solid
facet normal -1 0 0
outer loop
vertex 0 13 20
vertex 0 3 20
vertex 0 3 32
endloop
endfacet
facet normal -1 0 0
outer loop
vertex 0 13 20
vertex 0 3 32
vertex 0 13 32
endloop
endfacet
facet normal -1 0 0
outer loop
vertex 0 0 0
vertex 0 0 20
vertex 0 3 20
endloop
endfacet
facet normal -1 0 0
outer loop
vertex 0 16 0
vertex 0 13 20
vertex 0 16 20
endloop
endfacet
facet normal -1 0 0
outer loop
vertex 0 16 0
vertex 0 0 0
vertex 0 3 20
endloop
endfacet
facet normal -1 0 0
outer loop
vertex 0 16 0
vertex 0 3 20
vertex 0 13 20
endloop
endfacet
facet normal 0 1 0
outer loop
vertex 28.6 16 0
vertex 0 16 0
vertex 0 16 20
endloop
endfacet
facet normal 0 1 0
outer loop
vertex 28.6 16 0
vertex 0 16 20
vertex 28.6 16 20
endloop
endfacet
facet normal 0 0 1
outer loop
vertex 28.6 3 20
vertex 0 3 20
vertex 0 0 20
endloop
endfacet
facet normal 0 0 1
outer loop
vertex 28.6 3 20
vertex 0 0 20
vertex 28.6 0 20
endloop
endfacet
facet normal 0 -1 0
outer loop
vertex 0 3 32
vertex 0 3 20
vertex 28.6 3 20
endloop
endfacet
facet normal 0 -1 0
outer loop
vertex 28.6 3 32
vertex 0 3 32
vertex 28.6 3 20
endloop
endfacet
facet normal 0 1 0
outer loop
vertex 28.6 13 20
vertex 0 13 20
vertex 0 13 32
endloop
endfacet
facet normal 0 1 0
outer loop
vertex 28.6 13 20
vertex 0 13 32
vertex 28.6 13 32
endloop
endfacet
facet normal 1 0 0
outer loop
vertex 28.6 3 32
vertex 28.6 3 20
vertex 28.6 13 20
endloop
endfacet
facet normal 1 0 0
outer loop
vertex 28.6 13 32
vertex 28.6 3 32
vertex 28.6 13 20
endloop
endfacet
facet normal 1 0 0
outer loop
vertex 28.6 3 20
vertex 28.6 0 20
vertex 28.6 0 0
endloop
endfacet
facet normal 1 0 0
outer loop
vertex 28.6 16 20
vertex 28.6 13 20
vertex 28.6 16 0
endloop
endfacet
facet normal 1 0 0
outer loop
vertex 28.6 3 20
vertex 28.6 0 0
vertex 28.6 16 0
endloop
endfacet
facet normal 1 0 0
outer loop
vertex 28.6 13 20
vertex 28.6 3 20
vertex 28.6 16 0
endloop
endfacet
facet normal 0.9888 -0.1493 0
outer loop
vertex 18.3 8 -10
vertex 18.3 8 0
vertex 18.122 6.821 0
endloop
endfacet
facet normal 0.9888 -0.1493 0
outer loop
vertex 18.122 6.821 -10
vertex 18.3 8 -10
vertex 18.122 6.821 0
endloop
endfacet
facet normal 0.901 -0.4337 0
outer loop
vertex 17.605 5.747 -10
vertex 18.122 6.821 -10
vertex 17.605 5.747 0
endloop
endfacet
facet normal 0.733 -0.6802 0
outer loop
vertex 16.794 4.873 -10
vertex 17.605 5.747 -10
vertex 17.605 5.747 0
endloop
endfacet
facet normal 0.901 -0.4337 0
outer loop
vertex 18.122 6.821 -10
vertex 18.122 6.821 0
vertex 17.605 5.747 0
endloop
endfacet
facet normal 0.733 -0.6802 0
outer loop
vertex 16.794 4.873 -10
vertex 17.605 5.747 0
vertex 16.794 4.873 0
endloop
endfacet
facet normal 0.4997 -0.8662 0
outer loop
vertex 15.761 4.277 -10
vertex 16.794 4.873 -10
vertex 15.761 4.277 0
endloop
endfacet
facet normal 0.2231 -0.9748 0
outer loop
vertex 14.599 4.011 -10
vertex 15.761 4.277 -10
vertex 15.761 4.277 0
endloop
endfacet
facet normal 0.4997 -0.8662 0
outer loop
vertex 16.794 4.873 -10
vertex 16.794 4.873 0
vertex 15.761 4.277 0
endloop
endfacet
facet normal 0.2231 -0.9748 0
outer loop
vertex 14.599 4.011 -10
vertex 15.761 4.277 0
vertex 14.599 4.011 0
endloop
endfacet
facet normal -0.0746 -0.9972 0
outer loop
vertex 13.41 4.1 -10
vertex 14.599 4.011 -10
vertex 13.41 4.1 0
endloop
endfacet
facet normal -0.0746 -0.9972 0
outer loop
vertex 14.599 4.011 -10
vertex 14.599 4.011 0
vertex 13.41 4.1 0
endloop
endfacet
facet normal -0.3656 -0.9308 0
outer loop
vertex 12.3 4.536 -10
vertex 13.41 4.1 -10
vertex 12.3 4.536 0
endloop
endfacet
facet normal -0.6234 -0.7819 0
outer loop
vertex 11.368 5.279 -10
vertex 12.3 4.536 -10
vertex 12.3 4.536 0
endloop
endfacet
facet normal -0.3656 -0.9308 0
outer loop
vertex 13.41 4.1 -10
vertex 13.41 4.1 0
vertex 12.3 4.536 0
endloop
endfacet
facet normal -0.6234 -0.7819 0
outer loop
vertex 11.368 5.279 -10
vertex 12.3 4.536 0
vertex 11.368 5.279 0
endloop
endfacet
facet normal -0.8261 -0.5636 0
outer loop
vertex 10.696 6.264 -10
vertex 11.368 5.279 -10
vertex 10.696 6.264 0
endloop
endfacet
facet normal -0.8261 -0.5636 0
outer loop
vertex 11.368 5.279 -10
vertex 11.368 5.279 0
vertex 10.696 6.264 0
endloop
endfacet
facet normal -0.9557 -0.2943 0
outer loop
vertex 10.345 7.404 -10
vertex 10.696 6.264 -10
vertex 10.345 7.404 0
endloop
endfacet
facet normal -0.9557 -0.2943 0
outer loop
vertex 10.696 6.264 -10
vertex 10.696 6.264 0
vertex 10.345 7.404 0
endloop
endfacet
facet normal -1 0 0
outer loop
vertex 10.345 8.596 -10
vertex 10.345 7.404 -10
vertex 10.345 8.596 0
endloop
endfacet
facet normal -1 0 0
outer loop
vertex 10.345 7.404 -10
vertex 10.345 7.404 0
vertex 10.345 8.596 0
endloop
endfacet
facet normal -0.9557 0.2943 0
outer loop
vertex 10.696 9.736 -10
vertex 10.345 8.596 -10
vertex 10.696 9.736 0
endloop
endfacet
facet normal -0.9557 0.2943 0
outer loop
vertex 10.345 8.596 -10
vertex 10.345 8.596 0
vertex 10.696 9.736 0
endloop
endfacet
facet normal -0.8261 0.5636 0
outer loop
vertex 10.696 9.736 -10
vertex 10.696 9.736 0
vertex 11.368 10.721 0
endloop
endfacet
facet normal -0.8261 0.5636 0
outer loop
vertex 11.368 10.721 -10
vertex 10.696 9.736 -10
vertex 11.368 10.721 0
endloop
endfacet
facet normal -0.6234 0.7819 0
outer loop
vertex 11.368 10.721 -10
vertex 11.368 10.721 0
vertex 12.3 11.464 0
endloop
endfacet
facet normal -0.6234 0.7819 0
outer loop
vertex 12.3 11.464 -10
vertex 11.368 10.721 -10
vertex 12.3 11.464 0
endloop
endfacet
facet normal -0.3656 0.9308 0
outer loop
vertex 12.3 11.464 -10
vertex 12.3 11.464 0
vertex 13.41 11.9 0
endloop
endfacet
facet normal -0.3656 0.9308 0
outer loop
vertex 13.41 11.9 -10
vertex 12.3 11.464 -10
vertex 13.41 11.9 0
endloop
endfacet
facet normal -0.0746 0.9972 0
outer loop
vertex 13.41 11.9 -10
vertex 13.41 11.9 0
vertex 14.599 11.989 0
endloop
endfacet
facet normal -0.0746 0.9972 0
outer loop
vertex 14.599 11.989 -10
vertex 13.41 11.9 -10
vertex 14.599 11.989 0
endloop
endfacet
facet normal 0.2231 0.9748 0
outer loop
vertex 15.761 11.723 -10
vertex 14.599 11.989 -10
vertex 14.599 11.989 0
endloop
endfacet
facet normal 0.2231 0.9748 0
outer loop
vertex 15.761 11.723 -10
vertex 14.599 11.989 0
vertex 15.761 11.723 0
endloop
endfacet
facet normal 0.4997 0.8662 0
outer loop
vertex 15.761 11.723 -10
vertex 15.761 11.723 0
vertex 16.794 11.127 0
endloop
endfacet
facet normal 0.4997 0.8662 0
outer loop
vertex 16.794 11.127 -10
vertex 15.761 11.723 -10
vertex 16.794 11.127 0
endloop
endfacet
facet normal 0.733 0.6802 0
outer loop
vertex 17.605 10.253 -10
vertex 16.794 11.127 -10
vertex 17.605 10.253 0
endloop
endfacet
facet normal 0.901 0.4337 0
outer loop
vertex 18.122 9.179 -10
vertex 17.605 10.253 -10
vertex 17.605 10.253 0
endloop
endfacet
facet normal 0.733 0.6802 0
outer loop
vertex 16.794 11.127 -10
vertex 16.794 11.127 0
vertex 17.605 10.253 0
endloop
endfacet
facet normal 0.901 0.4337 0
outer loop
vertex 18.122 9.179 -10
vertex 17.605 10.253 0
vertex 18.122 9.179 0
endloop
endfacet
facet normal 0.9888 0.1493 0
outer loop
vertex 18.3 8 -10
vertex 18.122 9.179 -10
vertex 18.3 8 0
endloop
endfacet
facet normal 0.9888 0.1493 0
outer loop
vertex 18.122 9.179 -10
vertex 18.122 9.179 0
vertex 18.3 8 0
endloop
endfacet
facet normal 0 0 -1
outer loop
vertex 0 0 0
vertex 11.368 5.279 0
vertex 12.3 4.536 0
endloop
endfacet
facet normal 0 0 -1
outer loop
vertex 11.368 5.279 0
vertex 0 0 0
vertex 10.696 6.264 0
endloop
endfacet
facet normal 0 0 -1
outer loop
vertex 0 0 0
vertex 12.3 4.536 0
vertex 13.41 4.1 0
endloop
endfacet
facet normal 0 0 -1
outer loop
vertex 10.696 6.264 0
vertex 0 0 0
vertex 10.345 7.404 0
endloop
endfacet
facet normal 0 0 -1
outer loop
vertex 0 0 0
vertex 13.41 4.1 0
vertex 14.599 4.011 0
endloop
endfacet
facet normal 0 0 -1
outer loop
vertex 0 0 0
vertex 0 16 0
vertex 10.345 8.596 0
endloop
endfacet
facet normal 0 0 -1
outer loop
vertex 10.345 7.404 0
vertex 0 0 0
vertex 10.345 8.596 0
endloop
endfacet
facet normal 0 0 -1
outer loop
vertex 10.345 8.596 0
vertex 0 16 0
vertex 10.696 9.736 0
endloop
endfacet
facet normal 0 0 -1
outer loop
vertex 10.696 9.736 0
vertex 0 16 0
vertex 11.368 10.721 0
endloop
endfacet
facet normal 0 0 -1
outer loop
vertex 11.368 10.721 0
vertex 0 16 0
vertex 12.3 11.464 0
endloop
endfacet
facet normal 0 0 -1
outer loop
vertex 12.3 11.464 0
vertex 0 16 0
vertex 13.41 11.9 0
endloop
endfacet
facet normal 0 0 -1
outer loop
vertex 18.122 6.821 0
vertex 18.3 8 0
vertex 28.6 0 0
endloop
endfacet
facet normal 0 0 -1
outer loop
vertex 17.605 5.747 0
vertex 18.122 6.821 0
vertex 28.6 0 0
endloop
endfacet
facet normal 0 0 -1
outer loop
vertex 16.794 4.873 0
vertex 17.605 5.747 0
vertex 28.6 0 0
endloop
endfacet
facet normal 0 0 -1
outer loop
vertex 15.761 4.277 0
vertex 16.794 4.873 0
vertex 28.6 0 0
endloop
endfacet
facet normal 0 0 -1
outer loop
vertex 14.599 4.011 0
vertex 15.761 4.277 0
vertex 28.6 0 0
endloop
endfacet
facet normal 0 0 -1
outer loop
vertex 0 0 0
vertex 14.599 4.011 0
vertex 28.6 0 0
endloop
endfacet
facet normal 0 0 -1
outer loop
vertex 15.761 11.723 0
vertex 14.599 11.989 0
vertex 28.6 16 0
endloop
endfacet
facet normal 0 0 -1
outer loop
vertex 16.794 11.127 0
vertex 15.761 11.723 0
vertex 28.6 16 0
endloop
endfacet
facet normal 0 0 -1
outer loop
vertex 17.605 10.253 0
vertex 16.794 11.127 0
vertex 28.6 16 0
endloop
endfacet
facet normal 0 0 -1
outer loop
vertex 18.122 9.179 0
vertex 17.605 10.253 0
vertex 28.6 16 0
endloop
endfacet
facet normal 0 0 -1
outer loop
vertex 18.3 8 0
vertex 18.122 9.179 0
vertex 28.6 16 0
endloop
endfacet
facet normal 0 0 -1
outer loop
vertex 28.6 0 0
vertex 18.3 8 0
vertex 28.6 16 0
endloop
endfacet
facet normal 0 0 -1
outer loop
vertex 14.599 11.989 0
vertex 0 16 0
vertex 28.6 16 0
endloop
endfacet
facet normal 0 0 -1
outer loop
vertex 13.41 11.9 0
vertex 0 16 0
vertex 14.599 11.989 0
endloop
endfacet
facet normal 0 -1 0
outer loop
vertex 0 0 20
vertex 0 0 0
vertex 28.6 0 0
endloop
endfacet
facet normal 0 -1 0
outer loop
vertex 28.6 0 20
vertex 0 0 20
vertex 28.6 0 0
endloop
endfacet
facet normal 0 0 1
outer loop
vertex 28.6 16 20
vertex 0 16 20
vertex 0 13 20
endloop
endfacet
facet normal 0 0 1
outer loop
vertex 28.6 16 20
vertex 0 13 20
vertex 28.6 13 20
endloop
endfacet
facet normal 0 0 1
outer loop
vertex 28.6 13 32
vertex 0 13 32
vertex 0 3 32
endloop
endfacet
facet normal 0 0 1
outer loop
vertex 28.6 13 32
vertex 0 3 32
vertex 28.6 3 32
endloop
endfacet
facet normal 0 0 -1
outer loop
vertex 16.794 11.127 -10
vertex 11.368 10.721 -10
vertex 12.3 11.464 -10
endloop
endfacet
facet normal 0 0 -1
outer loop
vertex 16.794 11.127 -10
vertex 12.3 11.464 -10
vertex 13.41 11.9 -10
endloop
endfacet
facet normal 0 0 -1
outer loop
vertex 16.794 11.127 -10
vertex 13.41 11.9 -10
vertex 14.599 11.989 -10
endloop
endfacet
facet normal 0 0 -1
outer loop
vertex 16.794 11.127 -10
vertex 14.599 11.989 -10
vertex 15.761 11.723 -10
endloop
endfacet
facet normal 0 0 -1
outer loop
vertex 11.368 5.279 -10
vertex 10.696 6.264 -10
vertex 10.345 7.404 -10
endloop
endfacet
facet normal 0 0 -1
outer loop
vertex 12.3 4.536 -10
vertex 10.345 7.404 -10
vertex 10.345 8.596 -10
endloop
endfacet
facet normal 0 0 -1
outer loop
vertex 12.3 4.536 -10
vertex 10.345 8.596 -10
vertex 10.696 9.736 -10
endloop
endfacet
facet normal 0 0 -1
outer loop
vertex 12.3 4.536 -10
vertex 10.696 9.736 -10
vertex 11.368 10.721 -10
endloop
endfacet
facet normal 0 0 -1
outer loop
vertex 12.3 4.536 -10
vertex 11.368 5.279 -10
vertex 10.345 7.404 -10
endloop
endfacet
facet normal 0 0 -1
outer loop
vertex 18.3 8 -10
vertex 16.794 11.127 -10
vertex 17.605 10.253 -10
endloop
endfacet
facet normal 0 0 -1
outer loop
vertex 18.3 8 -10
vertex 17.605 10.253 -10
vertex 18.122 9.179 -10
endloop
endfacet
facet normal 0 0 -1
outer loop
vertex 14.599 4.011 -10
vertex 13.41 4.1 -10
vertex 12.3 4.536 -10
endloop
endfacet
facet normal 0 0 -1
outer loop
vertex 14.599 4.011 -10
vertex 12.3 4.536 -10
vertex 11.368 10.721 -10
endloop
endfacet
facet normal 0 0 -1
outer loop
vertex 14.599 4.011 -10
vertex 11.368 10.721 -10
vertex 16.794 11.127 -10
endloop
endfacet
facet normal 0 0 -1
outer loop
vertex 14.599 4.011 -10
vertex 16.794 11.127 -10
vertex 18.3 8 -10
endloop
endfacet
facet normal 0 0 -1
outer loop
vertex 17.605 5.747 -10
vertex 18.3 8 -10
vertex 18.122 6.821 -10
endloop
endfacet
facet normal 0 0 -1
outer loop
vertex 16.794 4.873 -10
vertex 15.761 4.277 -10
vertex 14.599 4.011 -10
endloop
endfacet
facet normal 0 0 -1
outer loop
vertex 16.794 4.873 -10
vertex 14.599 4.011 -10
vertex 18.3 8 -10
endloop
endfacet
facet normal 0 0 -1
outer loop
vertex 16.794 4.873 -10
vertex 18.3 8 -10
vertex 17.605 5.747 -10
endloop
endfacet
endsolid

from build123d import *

# Parameters (mm, degrees)
F0_W     = 28.6
F0_H     = 16
F1_DEPTH = 20
F2_W     = 28.6
F2_H     = 10
F3_DEPTH = 12
F4_R     = 4
F5_DEPTH = 10


with BuildPart() as f1:
    # F0 (on Top) → F1 (new body)
    with BuildSketch(Plane.XY):
        with Locations((14.3, 8)):
            Rectangle(F0_W, F0_H)
    extrude(amount=F1_DEPTH)

    # F2 (on face) → F3 (join)
    with BuildSketch(Plane.XY.offset(20)):
        with Locations((14.3, 8)):
            Rectangle(F2_W, F2_H)
    extrude(amount=F3_DEPTH)

    # F4 (on face) → F5 (join)
    with BuildSketch(Plane(origin=(0, 0, 0), x_dir=(1, 0, 0), z_dir=(0, 0, -1))):
        with Locations((14.3, -8)):
            Circle(F4_R)
    extrude(amount=F5_DEPTH)


solid = f1.part
